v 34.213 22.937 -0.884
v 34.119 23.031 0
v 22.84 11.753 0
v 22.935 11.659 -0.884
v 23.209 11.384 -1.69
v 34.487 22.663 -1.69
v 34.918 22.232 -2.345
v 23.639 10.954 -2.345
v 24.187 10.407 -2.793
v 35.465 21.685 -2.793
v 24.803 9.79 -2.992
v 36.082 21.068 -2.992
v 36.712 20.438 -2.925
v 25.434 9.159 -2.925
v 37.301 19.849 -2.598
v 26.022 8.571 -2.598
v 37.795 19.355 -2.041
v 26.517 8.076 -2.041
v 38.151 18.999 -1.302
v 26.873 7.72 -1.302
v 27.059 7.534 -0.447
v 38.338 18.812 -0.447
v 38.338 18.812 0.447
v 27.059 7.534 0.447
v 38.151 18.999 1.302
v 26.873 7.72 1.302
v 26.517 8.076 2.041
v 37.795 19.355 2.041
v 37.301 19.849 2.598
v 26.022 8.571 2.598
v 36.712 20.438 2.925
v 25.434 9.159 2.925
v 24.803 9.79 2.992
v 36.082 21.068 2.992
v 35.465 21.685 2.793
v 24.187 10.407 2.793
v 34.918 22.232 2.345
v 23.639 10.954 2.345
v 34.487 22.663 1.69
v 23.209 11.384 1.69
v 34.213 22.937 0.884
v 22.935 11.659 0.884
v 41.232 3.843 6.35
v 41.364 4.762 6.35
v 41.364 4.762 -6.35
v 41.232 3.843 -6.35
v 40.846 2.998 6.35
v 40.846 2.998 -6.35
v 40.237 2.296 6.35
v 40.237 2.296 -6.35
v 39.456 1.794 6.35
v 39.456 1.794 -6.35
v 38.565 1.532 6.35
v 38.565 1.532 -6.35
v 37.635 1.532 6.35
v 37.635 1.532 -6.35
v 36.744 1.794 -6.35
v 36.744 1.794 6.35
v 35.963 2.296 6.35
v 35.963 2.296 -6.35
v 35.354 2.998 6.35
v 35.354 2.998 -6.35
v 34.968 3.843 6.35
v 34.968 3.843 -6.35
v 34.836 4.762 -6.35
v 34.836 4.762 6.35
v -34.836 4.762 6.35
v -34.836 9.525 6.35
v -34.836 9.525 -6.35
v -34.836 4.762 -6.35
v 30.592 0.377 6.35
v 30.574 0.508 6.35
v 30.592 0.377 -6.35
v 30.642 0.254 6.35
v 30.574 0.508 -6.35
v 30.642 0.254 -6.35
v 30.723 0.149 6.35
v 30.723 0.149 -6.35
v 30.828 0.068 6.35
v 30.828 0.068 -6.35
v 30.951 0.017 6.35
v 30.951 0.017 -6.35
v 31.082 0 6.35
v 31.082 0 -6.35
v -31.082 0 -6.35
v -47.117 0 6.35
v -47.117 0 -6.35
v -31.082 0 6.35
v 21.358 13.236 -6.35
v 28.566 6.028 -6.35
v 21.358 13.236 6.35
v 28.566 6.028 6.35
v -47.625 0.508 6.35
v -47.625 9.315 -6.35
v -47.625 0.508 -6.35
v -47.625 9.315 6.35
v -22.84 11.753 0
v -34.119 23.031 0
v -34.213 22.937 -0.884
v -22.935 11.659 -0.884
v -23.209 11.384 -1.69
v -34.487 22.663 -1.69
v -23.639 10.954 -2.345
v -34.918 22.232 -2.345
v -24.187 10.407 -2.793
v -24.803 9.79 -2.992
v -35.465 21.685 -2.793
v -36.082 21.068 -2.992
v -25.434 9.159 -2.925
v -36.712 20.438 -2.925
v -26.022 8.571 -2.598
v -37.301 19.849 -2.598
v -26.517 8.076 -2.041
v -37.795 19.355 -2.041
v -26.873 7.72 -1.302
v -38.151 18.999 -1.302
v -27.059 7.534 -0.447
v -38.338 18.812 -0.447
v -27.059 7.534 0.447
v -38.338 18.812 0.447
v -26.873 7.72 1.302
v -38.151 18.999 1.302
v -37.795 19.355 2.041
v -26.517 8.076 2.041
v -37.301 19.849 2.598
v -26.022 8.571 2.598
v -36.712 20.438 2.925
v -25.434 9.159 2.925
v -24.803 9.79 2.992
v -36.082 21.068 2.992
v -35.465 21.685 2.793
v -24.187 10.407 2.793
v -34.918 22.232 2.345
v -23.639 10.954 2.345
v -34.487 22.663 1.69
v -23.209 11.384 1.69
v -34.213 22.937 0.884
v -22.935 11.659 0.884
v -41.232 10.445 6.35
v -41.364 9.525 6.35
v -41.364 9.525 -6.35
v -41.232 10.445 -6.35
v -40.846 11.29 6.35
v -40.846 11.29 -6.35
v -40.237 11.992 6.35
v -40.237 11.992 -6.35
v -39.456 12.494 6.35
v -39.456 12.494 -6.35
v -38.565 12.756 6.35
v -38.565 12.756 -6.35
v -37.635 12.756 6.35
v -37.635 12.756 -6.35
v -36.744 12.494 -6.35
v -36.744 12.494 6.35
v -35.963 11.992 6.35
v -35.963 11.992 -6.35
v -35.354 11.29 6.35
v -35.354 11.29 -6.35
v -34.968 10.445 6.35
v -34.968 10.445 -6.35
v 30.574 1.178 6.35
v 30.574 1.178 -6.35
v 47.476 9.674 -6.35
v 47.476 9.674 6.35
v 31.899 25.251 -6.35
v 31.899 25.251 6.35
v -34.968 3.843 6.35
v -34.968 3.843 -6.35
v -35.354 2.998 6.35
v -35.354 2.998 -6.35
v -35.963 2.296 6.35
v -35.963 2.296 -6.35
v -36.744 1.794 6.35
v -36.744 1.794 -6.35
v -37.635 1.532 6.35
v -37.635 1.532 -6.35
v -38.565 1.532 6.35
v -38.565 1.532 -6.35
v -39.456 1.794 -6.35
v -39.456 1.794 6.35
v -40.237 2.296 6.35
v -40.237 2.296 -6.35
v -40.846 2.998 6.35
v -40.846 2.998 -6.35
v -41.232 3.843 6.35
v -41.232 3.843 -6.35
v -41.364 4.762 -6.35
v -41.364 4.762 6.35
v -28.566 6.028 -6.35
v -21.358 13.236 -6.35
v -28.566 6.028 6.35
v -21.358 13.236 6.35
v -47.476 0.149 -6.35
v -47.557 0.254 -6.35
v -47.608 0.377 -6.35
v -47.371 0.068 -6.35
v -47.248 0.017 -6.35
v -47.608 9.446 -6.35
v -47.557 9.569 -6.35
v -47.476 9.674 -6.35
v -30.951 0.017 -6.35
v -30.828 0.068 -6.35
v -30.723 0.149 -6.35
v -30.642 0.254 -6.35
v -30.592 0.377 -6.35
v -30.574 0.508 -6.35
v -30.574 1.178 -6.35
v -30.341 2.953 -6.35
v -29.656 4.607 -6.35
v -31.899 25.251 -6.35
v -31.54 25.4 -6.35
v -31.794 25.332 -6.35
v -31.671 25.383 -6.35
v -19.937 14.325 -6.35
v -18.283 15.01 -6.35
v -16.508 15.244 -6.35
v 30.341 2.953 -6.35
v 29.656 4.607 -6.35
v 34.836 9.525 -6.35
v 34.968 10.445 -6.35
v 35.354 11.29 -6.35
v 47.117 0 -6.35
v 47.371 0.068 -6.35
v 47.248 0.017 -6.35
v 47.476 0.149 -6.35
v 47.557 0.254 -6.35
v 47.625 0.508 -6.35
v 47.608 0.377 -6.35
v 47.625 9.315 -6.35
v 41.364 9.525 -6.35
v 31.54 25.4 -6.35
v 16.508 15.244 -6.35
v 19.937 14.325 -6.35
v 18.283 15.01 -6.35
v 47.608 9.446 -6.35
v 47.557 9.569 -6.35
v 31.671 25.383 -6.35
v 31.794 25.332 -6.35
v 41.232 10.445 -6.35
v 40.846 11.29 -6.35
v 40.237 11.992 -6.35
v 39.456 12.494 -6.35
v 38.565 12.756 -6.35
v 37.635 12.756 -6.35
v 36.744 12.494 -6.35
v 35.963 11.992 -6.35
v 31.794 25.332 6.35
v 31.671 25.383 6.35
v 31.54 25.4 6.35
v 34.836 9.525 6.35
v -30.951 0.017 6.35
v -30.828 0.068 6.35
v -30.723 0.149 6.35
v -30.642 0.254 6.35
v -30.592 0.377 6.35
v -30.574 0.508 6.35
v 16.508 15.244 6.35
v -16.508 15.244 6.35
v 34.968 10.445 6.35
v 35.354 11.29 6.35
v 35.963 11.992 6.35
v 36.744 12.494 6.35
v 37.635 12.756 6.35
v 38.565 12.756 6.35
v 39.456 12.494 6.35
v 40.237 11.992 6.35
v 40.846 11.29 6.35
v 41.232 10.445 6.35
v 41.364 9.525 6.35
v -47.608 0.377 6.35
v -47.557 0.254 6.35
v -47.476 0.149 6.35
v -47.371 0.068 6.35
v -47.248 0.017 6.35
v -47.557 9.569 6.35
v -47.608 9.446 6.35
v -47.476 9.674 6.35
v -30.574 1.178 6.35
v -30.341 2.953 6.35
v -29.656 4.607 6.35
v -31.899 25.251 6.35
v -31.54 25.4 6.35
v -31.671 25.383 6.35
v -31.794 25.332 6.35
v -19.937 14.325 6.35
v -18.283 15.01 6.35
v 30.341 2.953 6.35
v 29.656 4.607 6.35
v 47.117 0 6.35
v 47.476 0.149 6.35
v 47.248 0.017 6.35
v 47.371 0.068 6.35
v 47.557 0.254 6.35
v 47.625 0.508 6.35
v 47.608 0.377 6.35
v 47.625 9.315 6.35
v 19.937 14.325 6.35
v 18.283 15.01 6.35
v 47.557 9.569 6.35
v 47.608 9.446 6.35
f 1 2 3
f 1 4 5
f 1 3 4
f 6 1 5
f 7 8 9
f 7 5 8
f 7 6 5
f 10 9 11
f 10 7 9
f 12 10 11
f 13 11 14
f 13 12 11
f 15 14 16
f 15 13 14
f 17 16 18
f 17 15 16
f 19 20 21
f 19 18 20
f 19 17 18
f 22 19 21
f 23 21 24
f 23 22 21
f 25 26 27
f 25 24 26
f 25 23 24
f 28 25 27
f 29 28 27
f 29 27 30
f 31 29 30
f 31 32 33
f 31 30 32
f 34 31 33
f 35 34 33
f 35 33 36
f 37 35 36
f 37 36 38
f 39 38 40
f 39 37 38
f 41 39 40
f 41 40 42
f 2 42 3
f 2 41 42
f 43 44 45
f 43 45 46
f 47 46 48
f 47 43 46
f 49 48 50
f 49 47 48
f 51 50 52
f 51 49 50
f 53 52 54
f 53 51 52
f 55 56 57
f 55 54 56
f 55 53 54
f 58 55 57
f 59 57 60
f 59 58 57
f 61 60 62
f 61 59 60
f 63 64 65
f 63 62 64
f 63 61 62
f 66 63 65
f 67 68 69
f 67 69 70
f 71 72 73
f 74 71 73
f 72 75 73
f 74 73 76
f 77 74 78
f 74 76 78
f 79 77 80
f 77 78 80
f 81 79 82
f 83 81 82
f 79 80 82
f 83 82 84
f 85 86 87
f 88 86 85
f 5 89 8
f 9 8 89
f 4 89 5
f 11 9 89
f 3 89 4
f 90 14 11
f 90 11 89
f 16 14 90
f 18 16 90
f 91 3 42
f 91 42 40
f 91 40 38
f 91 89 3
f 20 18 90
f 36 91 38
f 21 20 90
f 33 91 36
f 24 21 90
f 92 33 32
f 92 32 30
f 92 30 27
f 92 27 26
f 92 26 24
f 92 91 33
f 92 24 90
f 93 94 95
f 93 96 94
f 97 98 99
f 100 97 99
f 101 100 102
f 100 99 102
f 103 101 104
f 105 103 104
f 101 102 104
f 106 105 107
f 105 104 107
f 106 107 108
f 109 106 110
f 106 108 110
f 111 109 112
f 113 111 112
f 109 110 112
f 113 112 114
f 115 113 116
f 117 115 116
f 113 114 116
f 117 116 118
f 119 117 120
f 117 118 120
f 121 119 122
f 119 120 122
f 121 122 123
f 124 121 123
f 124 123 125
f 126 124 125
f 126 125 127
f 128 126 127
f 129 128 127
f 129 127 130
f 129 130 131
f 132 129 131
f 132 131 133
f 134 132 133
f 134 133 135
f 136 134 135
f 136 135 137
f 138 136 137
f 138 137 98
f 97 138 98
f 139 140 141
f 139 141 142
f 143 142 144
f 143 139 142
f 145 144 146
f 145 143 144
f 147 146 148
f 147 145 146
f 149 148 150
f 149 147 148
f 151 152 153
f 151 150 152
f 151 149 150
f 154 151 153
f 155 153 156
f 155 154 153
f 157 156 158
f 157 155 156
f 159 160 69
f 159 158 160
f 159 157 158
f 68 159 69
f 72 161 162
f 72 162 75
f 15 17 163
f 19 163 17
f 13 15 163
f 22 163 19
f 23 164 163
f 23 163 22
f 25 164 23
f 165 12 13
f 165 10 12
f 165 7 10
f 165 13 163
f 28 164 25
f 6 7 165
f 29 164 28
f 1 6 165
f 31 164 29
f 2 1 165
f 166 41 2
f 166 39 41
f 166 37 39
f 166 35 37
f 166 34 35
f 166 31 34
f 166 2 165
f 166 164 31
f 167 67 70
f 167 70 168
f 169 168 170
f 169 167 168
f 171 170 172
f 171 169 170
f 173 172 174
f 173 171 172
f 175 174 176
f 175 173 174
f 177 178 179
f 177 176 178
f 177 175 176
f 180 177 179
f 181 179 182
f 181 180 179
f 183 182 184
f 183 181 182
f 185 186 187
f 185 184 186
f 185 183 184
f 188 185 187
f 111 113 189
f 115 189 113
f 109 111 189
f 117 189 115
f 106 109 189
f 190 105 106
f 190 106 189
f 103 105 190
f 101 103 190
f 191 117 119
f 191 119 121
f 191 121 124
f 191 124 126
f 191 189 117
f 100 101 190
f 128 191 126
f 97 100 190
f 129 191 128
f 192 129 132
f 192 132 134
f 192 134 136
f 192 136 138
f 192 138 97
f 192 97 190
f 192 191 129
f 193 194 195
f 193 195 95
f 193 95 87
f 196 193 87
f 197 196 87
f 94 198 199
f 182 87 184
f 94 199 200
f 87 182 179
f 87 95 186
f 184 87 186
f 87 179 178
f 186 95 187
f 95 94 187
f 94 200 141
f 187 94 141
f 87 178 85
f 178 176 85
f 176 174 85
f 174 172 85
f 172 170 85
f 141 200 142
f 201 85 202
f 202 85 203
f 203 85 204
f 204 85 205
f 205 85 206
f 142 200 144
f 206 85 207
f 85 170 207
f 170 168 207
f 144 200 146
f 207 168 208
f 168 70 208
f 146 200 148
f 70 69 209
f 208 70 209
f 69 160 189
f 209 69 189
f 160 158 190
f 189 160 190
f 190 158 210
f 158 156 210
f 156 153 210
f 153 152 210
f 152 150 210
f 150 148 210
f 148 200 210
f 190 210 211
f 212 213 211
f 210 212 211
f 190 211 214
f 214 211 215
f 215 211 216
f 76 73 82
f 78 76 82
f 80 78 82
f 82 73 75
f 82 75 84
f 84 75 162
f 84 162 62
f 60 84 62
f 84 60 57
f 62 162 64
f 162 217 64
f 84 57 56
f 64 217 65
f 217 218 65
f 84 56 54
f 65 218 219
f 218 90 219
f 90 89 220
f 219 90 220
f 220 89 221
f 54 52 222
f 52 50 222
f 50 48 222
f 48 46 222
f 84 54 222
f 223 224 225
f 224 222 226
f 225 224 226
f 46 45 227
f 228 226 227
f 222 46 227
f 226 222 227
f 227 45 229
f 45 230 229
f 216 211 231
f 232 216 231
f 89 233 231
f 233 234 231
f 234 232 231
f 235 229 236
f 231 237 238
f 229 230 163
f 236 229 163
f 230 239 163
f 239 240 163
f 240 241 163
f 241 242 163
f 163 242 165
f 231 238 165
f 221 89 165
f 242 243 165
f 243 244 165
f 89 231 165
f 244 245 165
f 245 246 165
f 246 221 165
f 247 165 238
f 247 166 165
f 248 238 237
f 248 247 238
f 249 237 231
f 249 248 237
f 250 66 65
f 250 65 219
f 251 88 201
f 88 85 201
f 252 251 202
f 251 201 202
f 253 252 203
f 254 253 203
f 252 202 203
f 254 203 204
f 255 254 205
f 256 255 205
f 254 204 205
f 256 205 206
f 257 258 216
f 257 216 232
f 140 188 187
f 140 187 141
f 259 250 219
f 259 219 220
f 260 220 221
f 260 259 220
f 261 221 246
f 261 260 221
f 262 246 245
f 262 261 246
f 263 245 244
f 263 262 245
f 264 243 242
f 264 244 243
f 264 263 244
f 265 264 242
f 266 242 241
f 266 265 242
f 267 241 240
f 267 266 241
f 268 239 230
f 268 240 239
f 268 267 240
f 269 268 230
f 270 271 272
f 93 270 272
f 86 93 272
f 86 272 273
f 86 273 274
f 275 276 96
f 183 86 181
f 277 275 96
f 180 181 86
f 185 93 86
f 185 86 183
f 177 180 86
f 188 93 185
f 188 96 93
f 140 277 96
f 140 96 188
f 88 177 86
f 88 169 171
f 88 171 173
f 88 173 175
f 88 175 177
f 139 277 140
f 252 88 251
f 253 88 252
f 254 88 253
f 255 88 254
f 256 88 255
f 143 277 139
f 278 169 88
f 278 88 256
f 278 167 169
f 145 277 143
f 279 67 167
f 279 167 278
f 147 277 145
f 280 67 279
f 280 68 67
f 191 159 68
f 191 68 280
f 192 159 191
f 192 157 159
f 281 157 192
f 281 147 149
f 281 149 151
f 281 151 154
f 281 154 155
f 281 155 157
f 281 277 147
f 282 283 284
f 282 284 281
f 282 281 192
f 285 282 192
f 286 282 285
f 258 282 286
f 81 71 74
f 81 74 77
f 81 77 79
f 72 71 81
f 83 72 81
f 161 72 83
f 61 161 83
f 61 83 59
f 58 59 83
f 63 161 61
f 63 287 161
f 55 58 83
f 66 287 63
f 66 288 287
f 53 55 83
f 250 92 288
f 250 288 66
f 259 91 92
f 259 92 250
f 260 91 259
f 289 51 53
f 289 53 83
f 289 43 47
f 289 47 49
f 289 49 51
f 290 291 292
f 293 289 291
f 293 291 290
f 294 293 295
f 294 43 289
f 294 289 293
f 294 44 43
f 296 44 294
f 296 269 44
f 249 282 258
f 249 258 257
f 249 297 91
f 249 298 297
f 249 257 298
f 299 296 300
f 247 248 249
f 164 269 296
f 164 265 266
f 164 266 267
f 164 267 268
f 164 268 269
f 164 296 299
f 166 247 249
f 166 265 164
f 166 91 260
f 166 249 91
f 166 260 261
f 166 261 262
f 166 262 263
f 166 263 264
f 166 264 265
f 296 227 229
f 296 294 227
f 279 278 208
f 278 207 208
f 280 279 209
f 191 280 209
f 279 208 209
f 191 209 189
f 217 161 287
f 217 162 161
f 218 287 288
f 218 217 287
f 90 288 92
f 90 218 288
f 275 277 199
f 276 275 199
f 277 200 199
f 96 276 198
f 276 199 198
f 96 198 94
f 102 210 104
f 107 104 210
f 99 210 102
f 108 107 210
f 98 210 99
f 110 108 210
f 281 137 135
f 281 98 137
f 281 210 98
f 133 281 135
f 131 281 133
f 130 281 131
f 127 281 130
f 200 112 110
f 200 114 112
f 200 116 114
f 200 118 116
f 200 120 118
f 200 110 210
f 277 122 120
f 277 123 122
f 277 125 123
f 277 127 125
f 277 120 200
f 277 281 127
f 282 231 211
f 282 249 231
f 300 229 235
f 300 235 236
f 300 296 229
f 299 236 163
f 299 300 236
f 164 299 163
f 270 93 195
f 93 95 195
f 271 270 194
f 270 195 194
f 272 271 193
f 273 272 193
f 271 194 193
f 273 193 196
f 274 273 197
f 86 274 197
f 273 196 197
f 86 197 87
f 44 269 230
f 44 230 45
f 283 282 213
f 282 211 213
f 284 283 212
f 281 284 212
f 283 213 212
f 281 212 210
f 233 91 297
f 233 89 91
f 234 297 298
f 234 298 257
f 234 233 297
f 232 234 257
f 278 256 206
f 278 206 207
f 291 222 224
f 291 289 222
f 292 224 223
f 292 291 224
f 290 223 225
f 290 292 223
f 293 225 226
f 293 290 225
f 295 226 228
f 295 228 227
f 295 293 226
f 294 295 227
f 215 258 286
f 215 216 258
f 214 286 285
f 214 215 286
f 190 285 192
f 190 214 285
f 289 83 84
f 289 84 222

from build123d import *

# Parameters (mm, degrees)
BOSS_EXTRUDE1_DEPTH             = 6.35
CUT_EXTRUDE1_DEPTH              = 56.448991199
CUT_EXTRUDE2_DEPTH              = 56.448991199
FILLET1_R                       = 6.858
F_6_0MM_CLEARANCE_DOWEL_HOLE1_D = 6
FILLET2_R                       = 0.508


with BuildPart() as part:
    # Sketch1 → Boss-Extrude1 (new, symmetric)
    with BuildSketch(Plane.XY):
        Polygon((-47.625, 0), (47.625, 0), (47.625, 9.525), (31.75, 25.4), (-31.75, 25.4), (-47.625, 9.525), align=None)
    extrude(amount=BOSS_EXTRUDE1_DEPTH, both=True)

    # Sketch2 → Cut-Extrude1 (cut, through all)
    with BuildSketch(Plane.XY.offset(6.35)):
        with BuildLine():
            Line((-34.8361, 9.525), (-34.8361, 4.7625))
            ThreePointArc((-34.8361, 4.7625), (-38.1, 1.4986), (-41.3639, 4.7625))
            Line((-41.3639, 4.7625), (-41.3639, 9.525))
            ThreePointArc((-41.3639, 9.525), (-38.1, 12.7889), (-34.8361, 9.525))
        make_face()
        with BuildLine():
            Line((41.3639, 9.525), (41.3639, 4.7625))
            ThreePointArc((41.3639, 4.7625), (38.1, 1.4986), (34.8361, 4.7625))
            Line((34.8361, 4.7625), (34.8361, 9.525))
            ThreePointArc((34.8361, 9.525), (38.1, 12.7889), (41.3639, 9.525))
        make_face()
    extrude(amount=-CUT_EXTRUDE1_DEPTH, mode=Mode.SUBTRACT)

    # Sketch3 → Cut-Extrude2 (cut, through all)
    with BuildSketch(Plane.XY.offset(6.35)):
        Polygon((-30.574434976, 4.018858704), (-19.349114825, 15.244178855), (19.349114825, 15.244178855), (30.574434976, 4.018858704), (30.574434976, 0), (-30.574434976, 0), align=None)
    extrude(amount=-CUT_EXTRUDE2_DEPTH, mode=Mode.SUBTRACT)

    # Fillet1
    fillet1_edges = [part.edges().sort_by_distance(p)[0] for p in [
        (-19.349114825, 15.244178855, 0),
        (19.349114825, 15.244178855, 0),
        (30.574434976, 4.018858704, 0),
        (-30.574434976, 4.018858704, 0),
    ]]
    fillet(fillet1_edges, radius=FILLET1_R)

    # Ø6.0mm Clearance Dowel Hole1 (through all)
    with Locations(Plane(origin=(-17.29664684, 17.29664684, 0), x_dir=(-0.7071067811865511, -0.7071067811865439, 0), z_dir=(0.7071067811865439, -0.7071067811865511, 0))):
        with Locations((10.840128061, 0)):
            f_6_0mm_clearance_dowel_hole1 = Hole(F_6_0MM_CLEARANCE_DOWEL_HOLE1_D / 2)

    # Mirror2: Ø6.0mm Clearance Dowel Hole1 across plane
    add(f_6_0mm_clearance_dowel_hole1.mirror(Plane(origin=(0, 0, 0), x_dir=(0, 0, 1), z_dir=(1, 0, 0))), mode=Mode.SUBTRACT)

    # Fillet2
    fillet2_edges = [part.edges().sort_by_distance(p)[0] for p in [
        (-47.625, 9.525, 0),
        (-31.75, 25.4, 0),
        (31.75, 25.4, 0),
        (47.625, 9.525, 0),
        (47.625, 0, 0),
        (-47.625, 0, 0),
        (30.574434976, 0, 0),
        (-30.574434976, 0, 0),
    ]]
    fillet(fillet2_edges, radius=FILLET2_R)


solid = part.part
